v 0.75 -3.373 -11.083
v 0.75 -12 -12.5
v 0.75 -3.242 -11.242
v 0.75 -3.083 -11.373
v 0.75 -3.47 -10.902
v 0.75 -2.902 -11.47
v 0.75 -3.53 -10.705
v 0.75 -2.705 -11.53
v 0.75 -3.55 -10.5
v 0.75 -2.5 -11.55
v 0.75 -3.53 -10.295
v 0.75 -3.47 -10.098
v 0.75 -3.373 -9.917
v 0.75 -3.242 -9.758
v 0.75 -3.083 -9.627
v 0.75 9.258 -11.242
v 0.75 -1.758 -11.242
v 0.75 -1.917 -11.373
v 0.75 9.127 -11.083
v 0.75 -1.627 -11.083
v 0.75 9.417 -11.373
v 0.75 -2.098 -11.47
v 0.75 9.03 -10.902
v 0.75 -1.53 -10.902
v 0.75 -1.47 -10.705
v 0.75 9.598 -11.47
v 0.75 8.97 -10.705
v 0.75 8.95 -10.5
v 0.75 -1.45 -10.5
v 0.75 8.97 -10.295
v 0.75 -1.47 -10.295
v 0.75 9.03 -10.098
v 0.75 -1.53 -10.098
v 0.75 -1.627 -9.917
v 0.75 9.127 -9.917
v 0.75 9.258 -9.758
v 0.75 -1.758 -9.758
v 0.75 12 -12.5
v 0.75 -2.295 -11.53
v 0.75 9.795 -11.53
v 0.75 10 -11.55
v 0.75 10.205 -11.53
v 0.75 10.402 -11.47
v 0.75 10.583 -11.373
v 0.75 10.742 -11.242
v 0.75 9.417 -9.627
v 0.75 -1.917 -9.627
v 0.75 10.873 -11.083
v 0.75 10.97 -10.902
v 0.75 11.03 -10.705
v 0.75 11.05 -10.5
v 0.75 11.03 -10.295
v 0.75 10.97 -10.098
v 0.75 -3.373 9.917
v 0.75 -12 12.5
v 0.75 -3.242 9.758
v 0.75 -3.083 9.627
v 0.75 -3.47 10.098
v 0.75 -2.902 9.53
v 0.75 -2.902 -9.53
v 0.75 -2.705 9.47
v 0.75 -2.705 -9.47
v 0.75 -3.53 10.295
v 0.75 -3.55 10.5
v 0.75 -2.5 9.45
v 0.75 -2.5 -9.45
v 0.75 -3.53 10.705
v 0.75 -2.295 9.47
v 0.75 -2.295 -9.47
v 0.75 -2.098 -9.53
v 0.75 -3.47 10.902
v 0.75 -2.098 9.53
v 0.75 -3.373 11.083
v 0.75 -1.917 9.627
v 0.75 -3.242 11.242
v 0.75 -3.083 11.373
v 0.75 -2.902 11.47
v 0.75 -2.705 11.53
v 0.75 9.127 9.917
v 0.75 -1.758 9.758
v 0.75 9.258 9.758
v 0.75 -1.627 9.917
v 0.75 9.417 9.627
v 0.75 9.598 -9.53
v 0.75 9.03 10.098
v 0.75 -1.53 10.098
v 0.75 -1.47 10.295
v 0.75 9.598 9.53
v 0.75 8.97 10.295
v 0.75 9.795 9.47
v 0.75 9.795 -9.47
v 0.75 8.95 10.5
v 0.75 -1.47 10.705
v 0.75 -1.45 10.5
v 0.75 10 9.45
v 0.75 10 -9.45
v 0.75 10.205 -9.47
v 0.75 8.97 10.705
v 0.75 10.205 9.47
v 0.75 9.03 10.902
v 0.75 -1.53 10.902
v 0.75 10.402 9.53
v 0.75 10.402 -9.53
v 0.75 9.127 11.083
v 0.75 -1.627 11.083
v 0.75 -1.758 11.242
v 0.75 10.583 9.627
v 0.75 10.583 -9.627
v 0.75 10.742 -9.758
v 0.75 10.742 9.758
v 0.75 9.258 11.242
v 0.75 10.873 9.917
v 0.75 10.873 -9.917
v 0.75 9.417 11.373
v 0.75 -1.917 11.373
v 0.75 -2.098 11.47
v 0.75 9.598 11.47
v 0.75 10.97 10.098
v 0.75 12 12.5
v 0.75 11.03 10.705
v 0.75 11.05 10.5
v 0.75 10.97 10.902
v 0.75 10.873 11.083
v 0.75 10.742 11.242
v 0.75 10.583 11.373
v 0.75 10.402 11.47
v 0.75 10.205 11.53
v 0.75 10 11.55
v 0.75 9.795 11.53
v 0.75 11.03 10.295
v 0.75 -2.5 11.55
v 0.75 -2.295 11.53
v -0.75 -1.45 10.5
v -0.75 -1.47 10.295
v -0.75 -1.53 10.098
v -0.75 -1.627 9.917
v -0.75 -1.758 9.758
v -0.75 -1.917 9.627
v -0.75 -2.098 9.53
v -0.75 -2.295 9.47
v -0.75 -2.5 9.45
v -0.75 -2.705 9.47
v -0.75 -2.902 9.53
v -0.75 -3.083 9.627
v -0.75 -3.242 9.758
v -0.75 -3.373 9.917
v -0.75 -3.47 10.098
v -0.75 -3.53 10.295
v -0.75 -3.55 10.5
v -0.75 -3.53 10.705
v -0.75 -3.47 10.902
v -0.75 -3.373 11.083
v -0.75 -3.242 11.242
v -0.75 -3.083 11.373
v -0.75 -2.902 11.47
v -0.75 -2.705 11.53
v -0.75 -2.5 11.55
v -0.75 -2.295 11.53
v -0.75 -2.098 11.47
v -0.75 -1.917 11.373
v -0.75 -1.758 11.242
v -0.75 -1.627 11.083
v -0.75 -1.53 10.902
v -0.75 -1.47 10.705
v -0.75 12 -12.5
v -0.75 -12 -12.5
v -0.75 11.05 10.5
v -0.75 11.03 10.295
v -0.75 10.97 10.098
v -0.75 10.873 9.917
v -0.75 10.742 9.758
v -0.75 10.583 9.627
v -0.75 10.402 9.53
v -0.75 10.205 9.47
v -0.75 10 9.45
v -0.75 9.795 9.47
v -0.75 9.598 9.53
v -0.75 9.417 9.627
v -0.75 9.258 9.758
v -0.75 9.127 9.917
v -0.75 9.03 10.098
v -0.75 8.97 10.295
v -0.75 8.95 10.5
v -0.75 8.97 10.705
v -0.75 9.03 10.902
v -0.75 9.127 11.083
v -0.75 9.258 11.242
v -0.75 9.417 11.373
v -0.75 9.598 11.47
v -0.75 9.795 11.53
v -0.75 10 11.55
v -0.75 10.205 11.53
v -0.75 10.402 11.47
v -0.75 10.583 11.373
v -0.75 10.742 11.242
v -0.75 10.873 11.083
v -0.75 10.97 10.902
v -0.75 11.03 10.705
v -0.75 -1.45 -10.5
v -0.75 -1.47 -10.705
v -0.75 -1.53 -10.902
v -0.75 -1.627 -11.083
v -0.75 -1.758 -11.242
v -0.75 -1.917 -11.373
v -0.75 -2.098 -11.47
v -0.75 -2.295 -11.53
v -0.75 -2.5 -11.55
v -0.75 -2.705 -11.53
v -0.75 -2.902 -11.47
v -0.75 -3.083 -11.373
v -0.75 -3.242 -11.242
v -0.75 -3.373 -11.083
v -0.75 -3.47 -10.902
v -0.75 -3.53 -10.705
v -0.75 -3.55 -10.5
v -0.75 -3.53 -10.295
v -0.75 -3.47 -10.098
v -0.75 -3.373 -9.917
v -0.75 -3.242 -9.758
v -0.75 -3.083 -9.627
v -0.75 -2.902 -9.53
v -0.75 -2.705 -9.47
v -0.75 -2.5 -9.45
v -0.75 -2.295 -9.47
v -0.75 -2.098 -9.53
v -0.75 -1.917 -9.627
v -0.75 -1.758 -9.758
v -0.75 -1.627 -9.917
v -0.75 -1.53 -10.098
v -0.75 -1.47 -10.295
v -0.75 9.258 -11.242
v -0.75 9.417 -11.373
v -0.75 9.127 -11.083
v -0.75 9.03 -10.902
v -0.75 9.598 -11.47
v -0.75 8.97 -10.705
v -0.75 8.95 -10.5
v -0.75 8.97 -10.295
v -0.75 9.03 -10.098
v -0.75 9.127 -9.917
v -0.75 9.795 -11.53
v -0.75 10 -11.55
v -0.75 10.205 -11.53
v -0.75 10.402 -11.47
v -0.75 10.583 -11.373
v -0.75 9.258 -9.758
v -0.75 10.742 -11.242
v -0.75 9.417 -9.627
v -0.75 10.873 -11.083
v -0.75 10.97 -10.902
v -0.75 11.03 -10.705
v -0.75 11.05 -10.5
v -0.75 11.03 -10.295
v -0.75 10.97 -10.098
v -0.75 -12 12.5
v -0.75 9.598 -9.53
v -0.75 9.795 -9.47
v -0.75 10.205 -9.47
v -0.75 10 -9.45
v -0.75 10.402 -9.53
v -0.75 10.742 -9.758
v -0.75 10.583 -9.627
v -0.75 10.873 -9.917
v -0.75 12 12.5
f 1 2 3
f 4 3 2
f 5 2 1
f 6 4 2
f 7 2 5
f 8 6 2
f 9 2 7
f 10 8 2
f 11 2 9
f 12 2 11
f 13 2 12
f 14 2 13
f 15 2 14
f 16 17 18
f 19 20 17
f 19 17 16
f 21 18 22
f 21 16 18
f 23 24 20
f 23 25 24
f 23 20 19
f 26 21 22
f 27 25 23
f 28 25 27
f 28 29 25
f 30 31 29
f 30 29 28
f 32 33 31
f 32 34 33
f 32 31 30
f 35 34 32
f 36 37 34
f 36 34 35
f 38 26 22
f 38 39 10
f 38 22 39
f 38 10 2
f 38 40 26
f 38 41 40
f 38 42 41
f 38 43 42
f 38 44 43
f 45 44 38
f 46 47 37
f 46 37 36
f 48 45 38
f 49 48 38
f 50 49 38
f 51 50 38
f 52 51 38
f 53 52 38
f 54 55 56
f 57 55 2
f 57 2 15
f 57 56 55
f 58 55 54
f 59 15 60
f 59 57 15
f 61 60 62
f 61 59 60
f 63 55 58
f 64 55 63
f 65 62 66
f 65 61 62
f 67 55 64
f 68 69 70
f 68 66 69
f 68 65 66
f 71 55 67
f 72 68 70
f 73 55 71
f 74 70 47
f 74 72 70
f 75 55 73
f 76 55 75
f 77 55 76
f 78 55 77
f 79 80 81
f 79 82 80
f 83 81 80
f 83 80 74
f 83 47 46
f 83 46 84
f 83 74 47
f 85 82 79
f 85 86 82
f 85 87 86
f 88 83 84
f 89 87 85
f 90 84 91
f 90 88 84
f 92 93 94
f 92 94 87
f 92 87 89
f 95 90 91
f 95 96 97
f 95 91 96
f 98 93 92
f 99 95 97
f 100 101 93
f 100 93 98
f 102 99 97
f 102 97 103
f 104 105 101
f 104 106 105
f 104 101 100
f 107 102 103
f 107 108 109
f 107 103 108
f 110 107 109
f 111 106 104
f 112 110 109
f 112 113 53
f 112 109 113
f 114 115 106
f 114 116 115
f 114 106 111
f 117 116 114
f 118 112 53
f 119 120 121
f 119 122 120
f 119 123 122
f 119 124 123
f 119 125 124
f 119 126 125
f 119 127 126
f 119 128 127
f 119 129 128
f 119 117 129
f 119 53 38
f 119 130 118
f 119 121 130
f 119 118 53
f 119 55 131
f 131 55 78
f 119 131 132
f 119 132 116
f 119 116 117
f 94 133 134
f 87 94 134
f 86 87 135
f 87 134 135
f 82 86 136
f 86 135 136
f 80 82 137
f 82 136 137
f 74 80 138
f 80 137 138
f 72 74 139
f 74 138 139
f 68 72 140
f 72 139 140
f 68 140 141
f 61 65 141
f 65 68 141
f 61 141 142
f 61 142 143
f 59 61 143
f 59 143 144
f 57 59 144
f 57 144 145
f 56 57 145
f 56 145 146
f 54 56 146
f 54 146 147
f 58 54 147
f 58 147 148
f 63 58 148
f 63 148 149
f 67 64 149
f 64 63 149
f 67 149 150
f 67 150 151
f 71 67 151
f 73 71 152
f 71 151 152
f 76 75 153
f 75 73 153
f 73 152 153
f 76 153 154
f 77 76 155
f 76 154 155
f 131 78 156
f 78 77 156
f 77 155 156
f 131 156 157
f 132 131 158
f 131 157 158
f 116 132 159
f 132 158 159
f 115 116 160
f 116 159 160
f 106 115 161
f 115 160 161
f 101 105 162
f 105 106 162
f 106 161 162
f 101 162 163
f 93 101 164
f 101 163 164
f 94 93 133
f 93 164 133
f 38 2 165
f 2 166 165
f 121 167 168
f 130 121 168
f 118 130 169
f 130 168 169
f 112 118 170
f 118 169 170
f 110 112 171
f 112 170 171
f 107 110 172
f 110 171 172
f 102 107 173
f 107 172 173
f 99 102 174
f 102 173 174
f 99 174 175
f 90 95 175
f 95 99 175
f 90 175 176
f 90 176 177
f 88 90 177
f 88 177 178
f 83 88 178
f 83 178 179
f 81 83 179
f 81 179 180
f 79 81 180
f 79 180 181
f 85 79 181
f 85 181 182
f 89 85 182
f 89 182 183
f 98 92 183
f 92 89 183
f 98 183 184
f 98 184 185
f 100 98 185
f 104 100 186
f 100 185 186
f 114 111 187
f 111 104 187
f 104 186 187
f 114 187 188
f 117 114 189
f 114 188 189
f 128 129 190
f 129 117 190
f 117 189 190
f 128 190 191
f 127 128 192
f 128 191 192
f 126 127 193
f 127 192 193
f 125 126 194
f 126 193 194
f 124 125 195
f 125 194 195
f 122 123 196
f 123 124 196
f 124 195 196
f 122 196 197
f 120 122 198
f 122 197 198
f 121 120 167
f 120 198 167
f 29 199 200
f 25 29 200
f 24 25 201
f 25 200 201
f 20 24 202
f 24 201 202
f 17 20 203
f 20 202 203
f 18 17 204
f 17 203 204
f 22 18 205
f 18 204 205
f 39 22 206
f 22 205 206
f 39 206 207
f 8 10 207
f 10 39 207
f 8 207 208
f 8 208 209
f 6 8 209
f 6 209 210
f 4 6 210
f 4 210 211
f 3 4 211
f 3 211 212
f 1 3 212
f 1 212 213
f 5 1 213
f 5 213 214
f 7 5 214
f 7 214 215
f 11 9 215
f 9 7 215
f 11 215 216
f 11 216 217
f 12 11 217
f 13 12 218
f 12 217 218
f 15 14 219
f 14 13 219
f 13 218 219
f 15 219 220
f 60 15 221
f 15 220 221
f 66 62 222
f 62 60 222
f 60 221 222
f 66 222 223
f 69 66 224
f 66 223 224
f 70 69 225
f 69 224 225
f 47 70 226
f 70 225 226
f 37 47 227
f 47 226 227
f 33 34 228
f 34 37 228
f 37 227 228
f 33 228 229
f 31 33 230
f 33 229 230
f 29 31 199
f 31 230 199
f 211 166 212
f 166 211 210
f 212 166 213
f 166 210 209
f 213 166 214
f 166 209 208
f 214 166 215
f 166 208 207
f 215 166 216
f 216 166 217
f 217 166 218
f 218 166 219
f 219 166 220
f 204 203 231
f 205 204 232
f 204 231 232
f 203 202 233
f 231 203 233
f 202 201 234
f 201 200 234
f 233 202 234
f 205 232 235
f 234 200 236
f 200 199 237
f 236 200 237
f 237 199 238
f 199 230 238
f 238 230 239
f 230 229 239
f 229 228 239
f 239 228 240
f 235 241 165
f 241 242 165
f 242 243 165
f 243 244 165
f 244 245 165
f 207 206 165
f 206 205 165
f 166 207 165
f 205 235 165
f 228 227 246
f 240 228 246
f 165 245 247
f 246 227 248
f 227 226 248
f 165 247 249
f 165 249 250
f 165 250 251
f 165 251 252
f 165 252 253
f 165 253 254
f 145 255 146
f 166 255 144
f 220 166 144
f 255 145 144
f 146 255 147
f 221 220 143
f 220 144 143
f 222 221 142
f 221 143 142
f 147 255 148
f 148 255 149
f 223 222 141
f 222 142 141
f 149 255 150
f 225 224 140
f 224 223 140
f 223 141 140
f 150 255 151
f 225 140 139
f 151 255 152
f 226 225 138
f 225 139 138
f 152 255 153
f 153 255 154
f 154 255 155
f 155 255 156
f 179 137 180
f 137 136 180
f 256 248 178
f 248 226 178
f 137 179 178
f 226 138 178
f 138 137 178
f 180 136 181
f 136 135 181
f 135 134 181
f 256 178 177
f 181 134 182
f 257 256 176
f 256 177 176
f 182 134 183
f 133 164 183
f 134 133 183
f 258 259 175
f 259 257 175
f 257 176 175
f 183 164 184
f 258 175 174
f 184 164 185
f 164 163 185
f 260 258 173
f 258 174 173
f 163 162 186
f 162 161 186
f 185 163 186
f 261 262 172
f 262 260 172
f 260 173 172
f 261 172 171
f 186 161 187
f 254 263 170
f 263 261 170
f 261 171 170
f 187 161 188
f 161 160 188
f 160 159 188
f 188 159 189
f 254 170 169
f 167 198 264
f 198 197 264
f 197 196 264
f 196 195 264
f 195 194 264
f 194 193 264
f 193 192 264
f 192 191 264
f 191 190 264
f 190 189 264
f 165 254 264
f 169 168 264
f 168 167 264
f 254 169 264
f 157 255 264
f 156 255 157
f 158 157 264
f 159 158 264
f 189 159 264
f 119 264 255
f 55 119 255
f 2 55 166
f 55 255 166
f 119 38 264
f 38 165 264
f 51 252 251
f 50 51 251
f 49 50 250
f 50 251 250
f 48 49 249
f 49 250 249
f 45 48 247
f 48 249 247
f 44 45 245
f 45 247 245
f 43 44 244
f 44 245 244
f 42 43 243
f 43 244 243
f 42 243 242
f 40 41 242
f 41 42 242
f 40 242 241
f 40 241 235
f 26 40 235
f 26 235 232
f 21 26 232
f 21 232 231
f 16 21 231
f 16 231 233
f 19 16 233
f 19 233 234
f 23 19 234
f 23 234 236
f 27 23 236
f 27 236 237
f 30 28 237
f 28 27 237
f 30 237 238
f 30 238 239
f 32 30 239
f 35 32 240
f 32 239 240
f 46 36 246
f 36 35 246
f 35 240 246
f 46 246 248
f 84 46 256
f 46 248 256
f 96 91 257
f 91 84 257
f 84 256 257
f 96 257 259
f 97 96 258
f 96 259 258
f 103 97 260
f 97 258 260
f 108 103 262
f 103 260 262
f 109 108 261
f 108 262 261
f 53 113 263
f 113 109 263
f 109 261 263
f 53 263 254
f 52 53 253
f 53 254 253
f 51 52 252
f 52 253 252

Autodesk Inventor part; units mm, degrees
ref_plane "YZ Plane" through (0, 0, 0) normal (1, 0, 0) x (0, 1, 0)
ref_plane "XZ Plane" through (0, 0, 0) normal (0, 1, 0) x (-1, 0, 0)
ref_plane "XY Plane" through (0, 0, 0) normal (0, 0, 1) x (1, 0, 0)
sketch "Sketch1" plane through (0, 0, 0) normal (1, 0, 0) x (0, 1, 0)
  line L0 (12, 12.5) -> (-12, 12.5)
  line L1 (-12, 12.5) -> (-12, -12.5)
  line L2 (-12, -12.5) -> (12, -12.5)
  line L3 (12, -12.5) -> (12, 12.5)
  line L4 (12, 12.5) -> (-12, -12.5) construction
  line L5 (-12, 12.5) -> (12, -12.5) construction
  circle A0 centre (10, 10.5) radius 1.05
  line L6 (12, 0) -> (-12, 0) construction
  circle A1 centre (-2.5, 10.5) radius 1.05
  circle A2 centre (10, -10.5) radius 1.05
  circle A3 centre (-2.5, -10.5) radius 1.05
  point P0 (0, 0)
  dimension "d0" = 24
  dimension "d1" = 25
  dimension "d2" = 2.1
  dimension "d3" = 2
  dimension "d4" = 2
  dimension "d5" = 2.1
  dimension "d6" = 12.5
  dimension "d7" = 2
extrude "Extrusion1" add sketch "Sketch1" along normal mid plane 1.5
properties part number "Booard"
